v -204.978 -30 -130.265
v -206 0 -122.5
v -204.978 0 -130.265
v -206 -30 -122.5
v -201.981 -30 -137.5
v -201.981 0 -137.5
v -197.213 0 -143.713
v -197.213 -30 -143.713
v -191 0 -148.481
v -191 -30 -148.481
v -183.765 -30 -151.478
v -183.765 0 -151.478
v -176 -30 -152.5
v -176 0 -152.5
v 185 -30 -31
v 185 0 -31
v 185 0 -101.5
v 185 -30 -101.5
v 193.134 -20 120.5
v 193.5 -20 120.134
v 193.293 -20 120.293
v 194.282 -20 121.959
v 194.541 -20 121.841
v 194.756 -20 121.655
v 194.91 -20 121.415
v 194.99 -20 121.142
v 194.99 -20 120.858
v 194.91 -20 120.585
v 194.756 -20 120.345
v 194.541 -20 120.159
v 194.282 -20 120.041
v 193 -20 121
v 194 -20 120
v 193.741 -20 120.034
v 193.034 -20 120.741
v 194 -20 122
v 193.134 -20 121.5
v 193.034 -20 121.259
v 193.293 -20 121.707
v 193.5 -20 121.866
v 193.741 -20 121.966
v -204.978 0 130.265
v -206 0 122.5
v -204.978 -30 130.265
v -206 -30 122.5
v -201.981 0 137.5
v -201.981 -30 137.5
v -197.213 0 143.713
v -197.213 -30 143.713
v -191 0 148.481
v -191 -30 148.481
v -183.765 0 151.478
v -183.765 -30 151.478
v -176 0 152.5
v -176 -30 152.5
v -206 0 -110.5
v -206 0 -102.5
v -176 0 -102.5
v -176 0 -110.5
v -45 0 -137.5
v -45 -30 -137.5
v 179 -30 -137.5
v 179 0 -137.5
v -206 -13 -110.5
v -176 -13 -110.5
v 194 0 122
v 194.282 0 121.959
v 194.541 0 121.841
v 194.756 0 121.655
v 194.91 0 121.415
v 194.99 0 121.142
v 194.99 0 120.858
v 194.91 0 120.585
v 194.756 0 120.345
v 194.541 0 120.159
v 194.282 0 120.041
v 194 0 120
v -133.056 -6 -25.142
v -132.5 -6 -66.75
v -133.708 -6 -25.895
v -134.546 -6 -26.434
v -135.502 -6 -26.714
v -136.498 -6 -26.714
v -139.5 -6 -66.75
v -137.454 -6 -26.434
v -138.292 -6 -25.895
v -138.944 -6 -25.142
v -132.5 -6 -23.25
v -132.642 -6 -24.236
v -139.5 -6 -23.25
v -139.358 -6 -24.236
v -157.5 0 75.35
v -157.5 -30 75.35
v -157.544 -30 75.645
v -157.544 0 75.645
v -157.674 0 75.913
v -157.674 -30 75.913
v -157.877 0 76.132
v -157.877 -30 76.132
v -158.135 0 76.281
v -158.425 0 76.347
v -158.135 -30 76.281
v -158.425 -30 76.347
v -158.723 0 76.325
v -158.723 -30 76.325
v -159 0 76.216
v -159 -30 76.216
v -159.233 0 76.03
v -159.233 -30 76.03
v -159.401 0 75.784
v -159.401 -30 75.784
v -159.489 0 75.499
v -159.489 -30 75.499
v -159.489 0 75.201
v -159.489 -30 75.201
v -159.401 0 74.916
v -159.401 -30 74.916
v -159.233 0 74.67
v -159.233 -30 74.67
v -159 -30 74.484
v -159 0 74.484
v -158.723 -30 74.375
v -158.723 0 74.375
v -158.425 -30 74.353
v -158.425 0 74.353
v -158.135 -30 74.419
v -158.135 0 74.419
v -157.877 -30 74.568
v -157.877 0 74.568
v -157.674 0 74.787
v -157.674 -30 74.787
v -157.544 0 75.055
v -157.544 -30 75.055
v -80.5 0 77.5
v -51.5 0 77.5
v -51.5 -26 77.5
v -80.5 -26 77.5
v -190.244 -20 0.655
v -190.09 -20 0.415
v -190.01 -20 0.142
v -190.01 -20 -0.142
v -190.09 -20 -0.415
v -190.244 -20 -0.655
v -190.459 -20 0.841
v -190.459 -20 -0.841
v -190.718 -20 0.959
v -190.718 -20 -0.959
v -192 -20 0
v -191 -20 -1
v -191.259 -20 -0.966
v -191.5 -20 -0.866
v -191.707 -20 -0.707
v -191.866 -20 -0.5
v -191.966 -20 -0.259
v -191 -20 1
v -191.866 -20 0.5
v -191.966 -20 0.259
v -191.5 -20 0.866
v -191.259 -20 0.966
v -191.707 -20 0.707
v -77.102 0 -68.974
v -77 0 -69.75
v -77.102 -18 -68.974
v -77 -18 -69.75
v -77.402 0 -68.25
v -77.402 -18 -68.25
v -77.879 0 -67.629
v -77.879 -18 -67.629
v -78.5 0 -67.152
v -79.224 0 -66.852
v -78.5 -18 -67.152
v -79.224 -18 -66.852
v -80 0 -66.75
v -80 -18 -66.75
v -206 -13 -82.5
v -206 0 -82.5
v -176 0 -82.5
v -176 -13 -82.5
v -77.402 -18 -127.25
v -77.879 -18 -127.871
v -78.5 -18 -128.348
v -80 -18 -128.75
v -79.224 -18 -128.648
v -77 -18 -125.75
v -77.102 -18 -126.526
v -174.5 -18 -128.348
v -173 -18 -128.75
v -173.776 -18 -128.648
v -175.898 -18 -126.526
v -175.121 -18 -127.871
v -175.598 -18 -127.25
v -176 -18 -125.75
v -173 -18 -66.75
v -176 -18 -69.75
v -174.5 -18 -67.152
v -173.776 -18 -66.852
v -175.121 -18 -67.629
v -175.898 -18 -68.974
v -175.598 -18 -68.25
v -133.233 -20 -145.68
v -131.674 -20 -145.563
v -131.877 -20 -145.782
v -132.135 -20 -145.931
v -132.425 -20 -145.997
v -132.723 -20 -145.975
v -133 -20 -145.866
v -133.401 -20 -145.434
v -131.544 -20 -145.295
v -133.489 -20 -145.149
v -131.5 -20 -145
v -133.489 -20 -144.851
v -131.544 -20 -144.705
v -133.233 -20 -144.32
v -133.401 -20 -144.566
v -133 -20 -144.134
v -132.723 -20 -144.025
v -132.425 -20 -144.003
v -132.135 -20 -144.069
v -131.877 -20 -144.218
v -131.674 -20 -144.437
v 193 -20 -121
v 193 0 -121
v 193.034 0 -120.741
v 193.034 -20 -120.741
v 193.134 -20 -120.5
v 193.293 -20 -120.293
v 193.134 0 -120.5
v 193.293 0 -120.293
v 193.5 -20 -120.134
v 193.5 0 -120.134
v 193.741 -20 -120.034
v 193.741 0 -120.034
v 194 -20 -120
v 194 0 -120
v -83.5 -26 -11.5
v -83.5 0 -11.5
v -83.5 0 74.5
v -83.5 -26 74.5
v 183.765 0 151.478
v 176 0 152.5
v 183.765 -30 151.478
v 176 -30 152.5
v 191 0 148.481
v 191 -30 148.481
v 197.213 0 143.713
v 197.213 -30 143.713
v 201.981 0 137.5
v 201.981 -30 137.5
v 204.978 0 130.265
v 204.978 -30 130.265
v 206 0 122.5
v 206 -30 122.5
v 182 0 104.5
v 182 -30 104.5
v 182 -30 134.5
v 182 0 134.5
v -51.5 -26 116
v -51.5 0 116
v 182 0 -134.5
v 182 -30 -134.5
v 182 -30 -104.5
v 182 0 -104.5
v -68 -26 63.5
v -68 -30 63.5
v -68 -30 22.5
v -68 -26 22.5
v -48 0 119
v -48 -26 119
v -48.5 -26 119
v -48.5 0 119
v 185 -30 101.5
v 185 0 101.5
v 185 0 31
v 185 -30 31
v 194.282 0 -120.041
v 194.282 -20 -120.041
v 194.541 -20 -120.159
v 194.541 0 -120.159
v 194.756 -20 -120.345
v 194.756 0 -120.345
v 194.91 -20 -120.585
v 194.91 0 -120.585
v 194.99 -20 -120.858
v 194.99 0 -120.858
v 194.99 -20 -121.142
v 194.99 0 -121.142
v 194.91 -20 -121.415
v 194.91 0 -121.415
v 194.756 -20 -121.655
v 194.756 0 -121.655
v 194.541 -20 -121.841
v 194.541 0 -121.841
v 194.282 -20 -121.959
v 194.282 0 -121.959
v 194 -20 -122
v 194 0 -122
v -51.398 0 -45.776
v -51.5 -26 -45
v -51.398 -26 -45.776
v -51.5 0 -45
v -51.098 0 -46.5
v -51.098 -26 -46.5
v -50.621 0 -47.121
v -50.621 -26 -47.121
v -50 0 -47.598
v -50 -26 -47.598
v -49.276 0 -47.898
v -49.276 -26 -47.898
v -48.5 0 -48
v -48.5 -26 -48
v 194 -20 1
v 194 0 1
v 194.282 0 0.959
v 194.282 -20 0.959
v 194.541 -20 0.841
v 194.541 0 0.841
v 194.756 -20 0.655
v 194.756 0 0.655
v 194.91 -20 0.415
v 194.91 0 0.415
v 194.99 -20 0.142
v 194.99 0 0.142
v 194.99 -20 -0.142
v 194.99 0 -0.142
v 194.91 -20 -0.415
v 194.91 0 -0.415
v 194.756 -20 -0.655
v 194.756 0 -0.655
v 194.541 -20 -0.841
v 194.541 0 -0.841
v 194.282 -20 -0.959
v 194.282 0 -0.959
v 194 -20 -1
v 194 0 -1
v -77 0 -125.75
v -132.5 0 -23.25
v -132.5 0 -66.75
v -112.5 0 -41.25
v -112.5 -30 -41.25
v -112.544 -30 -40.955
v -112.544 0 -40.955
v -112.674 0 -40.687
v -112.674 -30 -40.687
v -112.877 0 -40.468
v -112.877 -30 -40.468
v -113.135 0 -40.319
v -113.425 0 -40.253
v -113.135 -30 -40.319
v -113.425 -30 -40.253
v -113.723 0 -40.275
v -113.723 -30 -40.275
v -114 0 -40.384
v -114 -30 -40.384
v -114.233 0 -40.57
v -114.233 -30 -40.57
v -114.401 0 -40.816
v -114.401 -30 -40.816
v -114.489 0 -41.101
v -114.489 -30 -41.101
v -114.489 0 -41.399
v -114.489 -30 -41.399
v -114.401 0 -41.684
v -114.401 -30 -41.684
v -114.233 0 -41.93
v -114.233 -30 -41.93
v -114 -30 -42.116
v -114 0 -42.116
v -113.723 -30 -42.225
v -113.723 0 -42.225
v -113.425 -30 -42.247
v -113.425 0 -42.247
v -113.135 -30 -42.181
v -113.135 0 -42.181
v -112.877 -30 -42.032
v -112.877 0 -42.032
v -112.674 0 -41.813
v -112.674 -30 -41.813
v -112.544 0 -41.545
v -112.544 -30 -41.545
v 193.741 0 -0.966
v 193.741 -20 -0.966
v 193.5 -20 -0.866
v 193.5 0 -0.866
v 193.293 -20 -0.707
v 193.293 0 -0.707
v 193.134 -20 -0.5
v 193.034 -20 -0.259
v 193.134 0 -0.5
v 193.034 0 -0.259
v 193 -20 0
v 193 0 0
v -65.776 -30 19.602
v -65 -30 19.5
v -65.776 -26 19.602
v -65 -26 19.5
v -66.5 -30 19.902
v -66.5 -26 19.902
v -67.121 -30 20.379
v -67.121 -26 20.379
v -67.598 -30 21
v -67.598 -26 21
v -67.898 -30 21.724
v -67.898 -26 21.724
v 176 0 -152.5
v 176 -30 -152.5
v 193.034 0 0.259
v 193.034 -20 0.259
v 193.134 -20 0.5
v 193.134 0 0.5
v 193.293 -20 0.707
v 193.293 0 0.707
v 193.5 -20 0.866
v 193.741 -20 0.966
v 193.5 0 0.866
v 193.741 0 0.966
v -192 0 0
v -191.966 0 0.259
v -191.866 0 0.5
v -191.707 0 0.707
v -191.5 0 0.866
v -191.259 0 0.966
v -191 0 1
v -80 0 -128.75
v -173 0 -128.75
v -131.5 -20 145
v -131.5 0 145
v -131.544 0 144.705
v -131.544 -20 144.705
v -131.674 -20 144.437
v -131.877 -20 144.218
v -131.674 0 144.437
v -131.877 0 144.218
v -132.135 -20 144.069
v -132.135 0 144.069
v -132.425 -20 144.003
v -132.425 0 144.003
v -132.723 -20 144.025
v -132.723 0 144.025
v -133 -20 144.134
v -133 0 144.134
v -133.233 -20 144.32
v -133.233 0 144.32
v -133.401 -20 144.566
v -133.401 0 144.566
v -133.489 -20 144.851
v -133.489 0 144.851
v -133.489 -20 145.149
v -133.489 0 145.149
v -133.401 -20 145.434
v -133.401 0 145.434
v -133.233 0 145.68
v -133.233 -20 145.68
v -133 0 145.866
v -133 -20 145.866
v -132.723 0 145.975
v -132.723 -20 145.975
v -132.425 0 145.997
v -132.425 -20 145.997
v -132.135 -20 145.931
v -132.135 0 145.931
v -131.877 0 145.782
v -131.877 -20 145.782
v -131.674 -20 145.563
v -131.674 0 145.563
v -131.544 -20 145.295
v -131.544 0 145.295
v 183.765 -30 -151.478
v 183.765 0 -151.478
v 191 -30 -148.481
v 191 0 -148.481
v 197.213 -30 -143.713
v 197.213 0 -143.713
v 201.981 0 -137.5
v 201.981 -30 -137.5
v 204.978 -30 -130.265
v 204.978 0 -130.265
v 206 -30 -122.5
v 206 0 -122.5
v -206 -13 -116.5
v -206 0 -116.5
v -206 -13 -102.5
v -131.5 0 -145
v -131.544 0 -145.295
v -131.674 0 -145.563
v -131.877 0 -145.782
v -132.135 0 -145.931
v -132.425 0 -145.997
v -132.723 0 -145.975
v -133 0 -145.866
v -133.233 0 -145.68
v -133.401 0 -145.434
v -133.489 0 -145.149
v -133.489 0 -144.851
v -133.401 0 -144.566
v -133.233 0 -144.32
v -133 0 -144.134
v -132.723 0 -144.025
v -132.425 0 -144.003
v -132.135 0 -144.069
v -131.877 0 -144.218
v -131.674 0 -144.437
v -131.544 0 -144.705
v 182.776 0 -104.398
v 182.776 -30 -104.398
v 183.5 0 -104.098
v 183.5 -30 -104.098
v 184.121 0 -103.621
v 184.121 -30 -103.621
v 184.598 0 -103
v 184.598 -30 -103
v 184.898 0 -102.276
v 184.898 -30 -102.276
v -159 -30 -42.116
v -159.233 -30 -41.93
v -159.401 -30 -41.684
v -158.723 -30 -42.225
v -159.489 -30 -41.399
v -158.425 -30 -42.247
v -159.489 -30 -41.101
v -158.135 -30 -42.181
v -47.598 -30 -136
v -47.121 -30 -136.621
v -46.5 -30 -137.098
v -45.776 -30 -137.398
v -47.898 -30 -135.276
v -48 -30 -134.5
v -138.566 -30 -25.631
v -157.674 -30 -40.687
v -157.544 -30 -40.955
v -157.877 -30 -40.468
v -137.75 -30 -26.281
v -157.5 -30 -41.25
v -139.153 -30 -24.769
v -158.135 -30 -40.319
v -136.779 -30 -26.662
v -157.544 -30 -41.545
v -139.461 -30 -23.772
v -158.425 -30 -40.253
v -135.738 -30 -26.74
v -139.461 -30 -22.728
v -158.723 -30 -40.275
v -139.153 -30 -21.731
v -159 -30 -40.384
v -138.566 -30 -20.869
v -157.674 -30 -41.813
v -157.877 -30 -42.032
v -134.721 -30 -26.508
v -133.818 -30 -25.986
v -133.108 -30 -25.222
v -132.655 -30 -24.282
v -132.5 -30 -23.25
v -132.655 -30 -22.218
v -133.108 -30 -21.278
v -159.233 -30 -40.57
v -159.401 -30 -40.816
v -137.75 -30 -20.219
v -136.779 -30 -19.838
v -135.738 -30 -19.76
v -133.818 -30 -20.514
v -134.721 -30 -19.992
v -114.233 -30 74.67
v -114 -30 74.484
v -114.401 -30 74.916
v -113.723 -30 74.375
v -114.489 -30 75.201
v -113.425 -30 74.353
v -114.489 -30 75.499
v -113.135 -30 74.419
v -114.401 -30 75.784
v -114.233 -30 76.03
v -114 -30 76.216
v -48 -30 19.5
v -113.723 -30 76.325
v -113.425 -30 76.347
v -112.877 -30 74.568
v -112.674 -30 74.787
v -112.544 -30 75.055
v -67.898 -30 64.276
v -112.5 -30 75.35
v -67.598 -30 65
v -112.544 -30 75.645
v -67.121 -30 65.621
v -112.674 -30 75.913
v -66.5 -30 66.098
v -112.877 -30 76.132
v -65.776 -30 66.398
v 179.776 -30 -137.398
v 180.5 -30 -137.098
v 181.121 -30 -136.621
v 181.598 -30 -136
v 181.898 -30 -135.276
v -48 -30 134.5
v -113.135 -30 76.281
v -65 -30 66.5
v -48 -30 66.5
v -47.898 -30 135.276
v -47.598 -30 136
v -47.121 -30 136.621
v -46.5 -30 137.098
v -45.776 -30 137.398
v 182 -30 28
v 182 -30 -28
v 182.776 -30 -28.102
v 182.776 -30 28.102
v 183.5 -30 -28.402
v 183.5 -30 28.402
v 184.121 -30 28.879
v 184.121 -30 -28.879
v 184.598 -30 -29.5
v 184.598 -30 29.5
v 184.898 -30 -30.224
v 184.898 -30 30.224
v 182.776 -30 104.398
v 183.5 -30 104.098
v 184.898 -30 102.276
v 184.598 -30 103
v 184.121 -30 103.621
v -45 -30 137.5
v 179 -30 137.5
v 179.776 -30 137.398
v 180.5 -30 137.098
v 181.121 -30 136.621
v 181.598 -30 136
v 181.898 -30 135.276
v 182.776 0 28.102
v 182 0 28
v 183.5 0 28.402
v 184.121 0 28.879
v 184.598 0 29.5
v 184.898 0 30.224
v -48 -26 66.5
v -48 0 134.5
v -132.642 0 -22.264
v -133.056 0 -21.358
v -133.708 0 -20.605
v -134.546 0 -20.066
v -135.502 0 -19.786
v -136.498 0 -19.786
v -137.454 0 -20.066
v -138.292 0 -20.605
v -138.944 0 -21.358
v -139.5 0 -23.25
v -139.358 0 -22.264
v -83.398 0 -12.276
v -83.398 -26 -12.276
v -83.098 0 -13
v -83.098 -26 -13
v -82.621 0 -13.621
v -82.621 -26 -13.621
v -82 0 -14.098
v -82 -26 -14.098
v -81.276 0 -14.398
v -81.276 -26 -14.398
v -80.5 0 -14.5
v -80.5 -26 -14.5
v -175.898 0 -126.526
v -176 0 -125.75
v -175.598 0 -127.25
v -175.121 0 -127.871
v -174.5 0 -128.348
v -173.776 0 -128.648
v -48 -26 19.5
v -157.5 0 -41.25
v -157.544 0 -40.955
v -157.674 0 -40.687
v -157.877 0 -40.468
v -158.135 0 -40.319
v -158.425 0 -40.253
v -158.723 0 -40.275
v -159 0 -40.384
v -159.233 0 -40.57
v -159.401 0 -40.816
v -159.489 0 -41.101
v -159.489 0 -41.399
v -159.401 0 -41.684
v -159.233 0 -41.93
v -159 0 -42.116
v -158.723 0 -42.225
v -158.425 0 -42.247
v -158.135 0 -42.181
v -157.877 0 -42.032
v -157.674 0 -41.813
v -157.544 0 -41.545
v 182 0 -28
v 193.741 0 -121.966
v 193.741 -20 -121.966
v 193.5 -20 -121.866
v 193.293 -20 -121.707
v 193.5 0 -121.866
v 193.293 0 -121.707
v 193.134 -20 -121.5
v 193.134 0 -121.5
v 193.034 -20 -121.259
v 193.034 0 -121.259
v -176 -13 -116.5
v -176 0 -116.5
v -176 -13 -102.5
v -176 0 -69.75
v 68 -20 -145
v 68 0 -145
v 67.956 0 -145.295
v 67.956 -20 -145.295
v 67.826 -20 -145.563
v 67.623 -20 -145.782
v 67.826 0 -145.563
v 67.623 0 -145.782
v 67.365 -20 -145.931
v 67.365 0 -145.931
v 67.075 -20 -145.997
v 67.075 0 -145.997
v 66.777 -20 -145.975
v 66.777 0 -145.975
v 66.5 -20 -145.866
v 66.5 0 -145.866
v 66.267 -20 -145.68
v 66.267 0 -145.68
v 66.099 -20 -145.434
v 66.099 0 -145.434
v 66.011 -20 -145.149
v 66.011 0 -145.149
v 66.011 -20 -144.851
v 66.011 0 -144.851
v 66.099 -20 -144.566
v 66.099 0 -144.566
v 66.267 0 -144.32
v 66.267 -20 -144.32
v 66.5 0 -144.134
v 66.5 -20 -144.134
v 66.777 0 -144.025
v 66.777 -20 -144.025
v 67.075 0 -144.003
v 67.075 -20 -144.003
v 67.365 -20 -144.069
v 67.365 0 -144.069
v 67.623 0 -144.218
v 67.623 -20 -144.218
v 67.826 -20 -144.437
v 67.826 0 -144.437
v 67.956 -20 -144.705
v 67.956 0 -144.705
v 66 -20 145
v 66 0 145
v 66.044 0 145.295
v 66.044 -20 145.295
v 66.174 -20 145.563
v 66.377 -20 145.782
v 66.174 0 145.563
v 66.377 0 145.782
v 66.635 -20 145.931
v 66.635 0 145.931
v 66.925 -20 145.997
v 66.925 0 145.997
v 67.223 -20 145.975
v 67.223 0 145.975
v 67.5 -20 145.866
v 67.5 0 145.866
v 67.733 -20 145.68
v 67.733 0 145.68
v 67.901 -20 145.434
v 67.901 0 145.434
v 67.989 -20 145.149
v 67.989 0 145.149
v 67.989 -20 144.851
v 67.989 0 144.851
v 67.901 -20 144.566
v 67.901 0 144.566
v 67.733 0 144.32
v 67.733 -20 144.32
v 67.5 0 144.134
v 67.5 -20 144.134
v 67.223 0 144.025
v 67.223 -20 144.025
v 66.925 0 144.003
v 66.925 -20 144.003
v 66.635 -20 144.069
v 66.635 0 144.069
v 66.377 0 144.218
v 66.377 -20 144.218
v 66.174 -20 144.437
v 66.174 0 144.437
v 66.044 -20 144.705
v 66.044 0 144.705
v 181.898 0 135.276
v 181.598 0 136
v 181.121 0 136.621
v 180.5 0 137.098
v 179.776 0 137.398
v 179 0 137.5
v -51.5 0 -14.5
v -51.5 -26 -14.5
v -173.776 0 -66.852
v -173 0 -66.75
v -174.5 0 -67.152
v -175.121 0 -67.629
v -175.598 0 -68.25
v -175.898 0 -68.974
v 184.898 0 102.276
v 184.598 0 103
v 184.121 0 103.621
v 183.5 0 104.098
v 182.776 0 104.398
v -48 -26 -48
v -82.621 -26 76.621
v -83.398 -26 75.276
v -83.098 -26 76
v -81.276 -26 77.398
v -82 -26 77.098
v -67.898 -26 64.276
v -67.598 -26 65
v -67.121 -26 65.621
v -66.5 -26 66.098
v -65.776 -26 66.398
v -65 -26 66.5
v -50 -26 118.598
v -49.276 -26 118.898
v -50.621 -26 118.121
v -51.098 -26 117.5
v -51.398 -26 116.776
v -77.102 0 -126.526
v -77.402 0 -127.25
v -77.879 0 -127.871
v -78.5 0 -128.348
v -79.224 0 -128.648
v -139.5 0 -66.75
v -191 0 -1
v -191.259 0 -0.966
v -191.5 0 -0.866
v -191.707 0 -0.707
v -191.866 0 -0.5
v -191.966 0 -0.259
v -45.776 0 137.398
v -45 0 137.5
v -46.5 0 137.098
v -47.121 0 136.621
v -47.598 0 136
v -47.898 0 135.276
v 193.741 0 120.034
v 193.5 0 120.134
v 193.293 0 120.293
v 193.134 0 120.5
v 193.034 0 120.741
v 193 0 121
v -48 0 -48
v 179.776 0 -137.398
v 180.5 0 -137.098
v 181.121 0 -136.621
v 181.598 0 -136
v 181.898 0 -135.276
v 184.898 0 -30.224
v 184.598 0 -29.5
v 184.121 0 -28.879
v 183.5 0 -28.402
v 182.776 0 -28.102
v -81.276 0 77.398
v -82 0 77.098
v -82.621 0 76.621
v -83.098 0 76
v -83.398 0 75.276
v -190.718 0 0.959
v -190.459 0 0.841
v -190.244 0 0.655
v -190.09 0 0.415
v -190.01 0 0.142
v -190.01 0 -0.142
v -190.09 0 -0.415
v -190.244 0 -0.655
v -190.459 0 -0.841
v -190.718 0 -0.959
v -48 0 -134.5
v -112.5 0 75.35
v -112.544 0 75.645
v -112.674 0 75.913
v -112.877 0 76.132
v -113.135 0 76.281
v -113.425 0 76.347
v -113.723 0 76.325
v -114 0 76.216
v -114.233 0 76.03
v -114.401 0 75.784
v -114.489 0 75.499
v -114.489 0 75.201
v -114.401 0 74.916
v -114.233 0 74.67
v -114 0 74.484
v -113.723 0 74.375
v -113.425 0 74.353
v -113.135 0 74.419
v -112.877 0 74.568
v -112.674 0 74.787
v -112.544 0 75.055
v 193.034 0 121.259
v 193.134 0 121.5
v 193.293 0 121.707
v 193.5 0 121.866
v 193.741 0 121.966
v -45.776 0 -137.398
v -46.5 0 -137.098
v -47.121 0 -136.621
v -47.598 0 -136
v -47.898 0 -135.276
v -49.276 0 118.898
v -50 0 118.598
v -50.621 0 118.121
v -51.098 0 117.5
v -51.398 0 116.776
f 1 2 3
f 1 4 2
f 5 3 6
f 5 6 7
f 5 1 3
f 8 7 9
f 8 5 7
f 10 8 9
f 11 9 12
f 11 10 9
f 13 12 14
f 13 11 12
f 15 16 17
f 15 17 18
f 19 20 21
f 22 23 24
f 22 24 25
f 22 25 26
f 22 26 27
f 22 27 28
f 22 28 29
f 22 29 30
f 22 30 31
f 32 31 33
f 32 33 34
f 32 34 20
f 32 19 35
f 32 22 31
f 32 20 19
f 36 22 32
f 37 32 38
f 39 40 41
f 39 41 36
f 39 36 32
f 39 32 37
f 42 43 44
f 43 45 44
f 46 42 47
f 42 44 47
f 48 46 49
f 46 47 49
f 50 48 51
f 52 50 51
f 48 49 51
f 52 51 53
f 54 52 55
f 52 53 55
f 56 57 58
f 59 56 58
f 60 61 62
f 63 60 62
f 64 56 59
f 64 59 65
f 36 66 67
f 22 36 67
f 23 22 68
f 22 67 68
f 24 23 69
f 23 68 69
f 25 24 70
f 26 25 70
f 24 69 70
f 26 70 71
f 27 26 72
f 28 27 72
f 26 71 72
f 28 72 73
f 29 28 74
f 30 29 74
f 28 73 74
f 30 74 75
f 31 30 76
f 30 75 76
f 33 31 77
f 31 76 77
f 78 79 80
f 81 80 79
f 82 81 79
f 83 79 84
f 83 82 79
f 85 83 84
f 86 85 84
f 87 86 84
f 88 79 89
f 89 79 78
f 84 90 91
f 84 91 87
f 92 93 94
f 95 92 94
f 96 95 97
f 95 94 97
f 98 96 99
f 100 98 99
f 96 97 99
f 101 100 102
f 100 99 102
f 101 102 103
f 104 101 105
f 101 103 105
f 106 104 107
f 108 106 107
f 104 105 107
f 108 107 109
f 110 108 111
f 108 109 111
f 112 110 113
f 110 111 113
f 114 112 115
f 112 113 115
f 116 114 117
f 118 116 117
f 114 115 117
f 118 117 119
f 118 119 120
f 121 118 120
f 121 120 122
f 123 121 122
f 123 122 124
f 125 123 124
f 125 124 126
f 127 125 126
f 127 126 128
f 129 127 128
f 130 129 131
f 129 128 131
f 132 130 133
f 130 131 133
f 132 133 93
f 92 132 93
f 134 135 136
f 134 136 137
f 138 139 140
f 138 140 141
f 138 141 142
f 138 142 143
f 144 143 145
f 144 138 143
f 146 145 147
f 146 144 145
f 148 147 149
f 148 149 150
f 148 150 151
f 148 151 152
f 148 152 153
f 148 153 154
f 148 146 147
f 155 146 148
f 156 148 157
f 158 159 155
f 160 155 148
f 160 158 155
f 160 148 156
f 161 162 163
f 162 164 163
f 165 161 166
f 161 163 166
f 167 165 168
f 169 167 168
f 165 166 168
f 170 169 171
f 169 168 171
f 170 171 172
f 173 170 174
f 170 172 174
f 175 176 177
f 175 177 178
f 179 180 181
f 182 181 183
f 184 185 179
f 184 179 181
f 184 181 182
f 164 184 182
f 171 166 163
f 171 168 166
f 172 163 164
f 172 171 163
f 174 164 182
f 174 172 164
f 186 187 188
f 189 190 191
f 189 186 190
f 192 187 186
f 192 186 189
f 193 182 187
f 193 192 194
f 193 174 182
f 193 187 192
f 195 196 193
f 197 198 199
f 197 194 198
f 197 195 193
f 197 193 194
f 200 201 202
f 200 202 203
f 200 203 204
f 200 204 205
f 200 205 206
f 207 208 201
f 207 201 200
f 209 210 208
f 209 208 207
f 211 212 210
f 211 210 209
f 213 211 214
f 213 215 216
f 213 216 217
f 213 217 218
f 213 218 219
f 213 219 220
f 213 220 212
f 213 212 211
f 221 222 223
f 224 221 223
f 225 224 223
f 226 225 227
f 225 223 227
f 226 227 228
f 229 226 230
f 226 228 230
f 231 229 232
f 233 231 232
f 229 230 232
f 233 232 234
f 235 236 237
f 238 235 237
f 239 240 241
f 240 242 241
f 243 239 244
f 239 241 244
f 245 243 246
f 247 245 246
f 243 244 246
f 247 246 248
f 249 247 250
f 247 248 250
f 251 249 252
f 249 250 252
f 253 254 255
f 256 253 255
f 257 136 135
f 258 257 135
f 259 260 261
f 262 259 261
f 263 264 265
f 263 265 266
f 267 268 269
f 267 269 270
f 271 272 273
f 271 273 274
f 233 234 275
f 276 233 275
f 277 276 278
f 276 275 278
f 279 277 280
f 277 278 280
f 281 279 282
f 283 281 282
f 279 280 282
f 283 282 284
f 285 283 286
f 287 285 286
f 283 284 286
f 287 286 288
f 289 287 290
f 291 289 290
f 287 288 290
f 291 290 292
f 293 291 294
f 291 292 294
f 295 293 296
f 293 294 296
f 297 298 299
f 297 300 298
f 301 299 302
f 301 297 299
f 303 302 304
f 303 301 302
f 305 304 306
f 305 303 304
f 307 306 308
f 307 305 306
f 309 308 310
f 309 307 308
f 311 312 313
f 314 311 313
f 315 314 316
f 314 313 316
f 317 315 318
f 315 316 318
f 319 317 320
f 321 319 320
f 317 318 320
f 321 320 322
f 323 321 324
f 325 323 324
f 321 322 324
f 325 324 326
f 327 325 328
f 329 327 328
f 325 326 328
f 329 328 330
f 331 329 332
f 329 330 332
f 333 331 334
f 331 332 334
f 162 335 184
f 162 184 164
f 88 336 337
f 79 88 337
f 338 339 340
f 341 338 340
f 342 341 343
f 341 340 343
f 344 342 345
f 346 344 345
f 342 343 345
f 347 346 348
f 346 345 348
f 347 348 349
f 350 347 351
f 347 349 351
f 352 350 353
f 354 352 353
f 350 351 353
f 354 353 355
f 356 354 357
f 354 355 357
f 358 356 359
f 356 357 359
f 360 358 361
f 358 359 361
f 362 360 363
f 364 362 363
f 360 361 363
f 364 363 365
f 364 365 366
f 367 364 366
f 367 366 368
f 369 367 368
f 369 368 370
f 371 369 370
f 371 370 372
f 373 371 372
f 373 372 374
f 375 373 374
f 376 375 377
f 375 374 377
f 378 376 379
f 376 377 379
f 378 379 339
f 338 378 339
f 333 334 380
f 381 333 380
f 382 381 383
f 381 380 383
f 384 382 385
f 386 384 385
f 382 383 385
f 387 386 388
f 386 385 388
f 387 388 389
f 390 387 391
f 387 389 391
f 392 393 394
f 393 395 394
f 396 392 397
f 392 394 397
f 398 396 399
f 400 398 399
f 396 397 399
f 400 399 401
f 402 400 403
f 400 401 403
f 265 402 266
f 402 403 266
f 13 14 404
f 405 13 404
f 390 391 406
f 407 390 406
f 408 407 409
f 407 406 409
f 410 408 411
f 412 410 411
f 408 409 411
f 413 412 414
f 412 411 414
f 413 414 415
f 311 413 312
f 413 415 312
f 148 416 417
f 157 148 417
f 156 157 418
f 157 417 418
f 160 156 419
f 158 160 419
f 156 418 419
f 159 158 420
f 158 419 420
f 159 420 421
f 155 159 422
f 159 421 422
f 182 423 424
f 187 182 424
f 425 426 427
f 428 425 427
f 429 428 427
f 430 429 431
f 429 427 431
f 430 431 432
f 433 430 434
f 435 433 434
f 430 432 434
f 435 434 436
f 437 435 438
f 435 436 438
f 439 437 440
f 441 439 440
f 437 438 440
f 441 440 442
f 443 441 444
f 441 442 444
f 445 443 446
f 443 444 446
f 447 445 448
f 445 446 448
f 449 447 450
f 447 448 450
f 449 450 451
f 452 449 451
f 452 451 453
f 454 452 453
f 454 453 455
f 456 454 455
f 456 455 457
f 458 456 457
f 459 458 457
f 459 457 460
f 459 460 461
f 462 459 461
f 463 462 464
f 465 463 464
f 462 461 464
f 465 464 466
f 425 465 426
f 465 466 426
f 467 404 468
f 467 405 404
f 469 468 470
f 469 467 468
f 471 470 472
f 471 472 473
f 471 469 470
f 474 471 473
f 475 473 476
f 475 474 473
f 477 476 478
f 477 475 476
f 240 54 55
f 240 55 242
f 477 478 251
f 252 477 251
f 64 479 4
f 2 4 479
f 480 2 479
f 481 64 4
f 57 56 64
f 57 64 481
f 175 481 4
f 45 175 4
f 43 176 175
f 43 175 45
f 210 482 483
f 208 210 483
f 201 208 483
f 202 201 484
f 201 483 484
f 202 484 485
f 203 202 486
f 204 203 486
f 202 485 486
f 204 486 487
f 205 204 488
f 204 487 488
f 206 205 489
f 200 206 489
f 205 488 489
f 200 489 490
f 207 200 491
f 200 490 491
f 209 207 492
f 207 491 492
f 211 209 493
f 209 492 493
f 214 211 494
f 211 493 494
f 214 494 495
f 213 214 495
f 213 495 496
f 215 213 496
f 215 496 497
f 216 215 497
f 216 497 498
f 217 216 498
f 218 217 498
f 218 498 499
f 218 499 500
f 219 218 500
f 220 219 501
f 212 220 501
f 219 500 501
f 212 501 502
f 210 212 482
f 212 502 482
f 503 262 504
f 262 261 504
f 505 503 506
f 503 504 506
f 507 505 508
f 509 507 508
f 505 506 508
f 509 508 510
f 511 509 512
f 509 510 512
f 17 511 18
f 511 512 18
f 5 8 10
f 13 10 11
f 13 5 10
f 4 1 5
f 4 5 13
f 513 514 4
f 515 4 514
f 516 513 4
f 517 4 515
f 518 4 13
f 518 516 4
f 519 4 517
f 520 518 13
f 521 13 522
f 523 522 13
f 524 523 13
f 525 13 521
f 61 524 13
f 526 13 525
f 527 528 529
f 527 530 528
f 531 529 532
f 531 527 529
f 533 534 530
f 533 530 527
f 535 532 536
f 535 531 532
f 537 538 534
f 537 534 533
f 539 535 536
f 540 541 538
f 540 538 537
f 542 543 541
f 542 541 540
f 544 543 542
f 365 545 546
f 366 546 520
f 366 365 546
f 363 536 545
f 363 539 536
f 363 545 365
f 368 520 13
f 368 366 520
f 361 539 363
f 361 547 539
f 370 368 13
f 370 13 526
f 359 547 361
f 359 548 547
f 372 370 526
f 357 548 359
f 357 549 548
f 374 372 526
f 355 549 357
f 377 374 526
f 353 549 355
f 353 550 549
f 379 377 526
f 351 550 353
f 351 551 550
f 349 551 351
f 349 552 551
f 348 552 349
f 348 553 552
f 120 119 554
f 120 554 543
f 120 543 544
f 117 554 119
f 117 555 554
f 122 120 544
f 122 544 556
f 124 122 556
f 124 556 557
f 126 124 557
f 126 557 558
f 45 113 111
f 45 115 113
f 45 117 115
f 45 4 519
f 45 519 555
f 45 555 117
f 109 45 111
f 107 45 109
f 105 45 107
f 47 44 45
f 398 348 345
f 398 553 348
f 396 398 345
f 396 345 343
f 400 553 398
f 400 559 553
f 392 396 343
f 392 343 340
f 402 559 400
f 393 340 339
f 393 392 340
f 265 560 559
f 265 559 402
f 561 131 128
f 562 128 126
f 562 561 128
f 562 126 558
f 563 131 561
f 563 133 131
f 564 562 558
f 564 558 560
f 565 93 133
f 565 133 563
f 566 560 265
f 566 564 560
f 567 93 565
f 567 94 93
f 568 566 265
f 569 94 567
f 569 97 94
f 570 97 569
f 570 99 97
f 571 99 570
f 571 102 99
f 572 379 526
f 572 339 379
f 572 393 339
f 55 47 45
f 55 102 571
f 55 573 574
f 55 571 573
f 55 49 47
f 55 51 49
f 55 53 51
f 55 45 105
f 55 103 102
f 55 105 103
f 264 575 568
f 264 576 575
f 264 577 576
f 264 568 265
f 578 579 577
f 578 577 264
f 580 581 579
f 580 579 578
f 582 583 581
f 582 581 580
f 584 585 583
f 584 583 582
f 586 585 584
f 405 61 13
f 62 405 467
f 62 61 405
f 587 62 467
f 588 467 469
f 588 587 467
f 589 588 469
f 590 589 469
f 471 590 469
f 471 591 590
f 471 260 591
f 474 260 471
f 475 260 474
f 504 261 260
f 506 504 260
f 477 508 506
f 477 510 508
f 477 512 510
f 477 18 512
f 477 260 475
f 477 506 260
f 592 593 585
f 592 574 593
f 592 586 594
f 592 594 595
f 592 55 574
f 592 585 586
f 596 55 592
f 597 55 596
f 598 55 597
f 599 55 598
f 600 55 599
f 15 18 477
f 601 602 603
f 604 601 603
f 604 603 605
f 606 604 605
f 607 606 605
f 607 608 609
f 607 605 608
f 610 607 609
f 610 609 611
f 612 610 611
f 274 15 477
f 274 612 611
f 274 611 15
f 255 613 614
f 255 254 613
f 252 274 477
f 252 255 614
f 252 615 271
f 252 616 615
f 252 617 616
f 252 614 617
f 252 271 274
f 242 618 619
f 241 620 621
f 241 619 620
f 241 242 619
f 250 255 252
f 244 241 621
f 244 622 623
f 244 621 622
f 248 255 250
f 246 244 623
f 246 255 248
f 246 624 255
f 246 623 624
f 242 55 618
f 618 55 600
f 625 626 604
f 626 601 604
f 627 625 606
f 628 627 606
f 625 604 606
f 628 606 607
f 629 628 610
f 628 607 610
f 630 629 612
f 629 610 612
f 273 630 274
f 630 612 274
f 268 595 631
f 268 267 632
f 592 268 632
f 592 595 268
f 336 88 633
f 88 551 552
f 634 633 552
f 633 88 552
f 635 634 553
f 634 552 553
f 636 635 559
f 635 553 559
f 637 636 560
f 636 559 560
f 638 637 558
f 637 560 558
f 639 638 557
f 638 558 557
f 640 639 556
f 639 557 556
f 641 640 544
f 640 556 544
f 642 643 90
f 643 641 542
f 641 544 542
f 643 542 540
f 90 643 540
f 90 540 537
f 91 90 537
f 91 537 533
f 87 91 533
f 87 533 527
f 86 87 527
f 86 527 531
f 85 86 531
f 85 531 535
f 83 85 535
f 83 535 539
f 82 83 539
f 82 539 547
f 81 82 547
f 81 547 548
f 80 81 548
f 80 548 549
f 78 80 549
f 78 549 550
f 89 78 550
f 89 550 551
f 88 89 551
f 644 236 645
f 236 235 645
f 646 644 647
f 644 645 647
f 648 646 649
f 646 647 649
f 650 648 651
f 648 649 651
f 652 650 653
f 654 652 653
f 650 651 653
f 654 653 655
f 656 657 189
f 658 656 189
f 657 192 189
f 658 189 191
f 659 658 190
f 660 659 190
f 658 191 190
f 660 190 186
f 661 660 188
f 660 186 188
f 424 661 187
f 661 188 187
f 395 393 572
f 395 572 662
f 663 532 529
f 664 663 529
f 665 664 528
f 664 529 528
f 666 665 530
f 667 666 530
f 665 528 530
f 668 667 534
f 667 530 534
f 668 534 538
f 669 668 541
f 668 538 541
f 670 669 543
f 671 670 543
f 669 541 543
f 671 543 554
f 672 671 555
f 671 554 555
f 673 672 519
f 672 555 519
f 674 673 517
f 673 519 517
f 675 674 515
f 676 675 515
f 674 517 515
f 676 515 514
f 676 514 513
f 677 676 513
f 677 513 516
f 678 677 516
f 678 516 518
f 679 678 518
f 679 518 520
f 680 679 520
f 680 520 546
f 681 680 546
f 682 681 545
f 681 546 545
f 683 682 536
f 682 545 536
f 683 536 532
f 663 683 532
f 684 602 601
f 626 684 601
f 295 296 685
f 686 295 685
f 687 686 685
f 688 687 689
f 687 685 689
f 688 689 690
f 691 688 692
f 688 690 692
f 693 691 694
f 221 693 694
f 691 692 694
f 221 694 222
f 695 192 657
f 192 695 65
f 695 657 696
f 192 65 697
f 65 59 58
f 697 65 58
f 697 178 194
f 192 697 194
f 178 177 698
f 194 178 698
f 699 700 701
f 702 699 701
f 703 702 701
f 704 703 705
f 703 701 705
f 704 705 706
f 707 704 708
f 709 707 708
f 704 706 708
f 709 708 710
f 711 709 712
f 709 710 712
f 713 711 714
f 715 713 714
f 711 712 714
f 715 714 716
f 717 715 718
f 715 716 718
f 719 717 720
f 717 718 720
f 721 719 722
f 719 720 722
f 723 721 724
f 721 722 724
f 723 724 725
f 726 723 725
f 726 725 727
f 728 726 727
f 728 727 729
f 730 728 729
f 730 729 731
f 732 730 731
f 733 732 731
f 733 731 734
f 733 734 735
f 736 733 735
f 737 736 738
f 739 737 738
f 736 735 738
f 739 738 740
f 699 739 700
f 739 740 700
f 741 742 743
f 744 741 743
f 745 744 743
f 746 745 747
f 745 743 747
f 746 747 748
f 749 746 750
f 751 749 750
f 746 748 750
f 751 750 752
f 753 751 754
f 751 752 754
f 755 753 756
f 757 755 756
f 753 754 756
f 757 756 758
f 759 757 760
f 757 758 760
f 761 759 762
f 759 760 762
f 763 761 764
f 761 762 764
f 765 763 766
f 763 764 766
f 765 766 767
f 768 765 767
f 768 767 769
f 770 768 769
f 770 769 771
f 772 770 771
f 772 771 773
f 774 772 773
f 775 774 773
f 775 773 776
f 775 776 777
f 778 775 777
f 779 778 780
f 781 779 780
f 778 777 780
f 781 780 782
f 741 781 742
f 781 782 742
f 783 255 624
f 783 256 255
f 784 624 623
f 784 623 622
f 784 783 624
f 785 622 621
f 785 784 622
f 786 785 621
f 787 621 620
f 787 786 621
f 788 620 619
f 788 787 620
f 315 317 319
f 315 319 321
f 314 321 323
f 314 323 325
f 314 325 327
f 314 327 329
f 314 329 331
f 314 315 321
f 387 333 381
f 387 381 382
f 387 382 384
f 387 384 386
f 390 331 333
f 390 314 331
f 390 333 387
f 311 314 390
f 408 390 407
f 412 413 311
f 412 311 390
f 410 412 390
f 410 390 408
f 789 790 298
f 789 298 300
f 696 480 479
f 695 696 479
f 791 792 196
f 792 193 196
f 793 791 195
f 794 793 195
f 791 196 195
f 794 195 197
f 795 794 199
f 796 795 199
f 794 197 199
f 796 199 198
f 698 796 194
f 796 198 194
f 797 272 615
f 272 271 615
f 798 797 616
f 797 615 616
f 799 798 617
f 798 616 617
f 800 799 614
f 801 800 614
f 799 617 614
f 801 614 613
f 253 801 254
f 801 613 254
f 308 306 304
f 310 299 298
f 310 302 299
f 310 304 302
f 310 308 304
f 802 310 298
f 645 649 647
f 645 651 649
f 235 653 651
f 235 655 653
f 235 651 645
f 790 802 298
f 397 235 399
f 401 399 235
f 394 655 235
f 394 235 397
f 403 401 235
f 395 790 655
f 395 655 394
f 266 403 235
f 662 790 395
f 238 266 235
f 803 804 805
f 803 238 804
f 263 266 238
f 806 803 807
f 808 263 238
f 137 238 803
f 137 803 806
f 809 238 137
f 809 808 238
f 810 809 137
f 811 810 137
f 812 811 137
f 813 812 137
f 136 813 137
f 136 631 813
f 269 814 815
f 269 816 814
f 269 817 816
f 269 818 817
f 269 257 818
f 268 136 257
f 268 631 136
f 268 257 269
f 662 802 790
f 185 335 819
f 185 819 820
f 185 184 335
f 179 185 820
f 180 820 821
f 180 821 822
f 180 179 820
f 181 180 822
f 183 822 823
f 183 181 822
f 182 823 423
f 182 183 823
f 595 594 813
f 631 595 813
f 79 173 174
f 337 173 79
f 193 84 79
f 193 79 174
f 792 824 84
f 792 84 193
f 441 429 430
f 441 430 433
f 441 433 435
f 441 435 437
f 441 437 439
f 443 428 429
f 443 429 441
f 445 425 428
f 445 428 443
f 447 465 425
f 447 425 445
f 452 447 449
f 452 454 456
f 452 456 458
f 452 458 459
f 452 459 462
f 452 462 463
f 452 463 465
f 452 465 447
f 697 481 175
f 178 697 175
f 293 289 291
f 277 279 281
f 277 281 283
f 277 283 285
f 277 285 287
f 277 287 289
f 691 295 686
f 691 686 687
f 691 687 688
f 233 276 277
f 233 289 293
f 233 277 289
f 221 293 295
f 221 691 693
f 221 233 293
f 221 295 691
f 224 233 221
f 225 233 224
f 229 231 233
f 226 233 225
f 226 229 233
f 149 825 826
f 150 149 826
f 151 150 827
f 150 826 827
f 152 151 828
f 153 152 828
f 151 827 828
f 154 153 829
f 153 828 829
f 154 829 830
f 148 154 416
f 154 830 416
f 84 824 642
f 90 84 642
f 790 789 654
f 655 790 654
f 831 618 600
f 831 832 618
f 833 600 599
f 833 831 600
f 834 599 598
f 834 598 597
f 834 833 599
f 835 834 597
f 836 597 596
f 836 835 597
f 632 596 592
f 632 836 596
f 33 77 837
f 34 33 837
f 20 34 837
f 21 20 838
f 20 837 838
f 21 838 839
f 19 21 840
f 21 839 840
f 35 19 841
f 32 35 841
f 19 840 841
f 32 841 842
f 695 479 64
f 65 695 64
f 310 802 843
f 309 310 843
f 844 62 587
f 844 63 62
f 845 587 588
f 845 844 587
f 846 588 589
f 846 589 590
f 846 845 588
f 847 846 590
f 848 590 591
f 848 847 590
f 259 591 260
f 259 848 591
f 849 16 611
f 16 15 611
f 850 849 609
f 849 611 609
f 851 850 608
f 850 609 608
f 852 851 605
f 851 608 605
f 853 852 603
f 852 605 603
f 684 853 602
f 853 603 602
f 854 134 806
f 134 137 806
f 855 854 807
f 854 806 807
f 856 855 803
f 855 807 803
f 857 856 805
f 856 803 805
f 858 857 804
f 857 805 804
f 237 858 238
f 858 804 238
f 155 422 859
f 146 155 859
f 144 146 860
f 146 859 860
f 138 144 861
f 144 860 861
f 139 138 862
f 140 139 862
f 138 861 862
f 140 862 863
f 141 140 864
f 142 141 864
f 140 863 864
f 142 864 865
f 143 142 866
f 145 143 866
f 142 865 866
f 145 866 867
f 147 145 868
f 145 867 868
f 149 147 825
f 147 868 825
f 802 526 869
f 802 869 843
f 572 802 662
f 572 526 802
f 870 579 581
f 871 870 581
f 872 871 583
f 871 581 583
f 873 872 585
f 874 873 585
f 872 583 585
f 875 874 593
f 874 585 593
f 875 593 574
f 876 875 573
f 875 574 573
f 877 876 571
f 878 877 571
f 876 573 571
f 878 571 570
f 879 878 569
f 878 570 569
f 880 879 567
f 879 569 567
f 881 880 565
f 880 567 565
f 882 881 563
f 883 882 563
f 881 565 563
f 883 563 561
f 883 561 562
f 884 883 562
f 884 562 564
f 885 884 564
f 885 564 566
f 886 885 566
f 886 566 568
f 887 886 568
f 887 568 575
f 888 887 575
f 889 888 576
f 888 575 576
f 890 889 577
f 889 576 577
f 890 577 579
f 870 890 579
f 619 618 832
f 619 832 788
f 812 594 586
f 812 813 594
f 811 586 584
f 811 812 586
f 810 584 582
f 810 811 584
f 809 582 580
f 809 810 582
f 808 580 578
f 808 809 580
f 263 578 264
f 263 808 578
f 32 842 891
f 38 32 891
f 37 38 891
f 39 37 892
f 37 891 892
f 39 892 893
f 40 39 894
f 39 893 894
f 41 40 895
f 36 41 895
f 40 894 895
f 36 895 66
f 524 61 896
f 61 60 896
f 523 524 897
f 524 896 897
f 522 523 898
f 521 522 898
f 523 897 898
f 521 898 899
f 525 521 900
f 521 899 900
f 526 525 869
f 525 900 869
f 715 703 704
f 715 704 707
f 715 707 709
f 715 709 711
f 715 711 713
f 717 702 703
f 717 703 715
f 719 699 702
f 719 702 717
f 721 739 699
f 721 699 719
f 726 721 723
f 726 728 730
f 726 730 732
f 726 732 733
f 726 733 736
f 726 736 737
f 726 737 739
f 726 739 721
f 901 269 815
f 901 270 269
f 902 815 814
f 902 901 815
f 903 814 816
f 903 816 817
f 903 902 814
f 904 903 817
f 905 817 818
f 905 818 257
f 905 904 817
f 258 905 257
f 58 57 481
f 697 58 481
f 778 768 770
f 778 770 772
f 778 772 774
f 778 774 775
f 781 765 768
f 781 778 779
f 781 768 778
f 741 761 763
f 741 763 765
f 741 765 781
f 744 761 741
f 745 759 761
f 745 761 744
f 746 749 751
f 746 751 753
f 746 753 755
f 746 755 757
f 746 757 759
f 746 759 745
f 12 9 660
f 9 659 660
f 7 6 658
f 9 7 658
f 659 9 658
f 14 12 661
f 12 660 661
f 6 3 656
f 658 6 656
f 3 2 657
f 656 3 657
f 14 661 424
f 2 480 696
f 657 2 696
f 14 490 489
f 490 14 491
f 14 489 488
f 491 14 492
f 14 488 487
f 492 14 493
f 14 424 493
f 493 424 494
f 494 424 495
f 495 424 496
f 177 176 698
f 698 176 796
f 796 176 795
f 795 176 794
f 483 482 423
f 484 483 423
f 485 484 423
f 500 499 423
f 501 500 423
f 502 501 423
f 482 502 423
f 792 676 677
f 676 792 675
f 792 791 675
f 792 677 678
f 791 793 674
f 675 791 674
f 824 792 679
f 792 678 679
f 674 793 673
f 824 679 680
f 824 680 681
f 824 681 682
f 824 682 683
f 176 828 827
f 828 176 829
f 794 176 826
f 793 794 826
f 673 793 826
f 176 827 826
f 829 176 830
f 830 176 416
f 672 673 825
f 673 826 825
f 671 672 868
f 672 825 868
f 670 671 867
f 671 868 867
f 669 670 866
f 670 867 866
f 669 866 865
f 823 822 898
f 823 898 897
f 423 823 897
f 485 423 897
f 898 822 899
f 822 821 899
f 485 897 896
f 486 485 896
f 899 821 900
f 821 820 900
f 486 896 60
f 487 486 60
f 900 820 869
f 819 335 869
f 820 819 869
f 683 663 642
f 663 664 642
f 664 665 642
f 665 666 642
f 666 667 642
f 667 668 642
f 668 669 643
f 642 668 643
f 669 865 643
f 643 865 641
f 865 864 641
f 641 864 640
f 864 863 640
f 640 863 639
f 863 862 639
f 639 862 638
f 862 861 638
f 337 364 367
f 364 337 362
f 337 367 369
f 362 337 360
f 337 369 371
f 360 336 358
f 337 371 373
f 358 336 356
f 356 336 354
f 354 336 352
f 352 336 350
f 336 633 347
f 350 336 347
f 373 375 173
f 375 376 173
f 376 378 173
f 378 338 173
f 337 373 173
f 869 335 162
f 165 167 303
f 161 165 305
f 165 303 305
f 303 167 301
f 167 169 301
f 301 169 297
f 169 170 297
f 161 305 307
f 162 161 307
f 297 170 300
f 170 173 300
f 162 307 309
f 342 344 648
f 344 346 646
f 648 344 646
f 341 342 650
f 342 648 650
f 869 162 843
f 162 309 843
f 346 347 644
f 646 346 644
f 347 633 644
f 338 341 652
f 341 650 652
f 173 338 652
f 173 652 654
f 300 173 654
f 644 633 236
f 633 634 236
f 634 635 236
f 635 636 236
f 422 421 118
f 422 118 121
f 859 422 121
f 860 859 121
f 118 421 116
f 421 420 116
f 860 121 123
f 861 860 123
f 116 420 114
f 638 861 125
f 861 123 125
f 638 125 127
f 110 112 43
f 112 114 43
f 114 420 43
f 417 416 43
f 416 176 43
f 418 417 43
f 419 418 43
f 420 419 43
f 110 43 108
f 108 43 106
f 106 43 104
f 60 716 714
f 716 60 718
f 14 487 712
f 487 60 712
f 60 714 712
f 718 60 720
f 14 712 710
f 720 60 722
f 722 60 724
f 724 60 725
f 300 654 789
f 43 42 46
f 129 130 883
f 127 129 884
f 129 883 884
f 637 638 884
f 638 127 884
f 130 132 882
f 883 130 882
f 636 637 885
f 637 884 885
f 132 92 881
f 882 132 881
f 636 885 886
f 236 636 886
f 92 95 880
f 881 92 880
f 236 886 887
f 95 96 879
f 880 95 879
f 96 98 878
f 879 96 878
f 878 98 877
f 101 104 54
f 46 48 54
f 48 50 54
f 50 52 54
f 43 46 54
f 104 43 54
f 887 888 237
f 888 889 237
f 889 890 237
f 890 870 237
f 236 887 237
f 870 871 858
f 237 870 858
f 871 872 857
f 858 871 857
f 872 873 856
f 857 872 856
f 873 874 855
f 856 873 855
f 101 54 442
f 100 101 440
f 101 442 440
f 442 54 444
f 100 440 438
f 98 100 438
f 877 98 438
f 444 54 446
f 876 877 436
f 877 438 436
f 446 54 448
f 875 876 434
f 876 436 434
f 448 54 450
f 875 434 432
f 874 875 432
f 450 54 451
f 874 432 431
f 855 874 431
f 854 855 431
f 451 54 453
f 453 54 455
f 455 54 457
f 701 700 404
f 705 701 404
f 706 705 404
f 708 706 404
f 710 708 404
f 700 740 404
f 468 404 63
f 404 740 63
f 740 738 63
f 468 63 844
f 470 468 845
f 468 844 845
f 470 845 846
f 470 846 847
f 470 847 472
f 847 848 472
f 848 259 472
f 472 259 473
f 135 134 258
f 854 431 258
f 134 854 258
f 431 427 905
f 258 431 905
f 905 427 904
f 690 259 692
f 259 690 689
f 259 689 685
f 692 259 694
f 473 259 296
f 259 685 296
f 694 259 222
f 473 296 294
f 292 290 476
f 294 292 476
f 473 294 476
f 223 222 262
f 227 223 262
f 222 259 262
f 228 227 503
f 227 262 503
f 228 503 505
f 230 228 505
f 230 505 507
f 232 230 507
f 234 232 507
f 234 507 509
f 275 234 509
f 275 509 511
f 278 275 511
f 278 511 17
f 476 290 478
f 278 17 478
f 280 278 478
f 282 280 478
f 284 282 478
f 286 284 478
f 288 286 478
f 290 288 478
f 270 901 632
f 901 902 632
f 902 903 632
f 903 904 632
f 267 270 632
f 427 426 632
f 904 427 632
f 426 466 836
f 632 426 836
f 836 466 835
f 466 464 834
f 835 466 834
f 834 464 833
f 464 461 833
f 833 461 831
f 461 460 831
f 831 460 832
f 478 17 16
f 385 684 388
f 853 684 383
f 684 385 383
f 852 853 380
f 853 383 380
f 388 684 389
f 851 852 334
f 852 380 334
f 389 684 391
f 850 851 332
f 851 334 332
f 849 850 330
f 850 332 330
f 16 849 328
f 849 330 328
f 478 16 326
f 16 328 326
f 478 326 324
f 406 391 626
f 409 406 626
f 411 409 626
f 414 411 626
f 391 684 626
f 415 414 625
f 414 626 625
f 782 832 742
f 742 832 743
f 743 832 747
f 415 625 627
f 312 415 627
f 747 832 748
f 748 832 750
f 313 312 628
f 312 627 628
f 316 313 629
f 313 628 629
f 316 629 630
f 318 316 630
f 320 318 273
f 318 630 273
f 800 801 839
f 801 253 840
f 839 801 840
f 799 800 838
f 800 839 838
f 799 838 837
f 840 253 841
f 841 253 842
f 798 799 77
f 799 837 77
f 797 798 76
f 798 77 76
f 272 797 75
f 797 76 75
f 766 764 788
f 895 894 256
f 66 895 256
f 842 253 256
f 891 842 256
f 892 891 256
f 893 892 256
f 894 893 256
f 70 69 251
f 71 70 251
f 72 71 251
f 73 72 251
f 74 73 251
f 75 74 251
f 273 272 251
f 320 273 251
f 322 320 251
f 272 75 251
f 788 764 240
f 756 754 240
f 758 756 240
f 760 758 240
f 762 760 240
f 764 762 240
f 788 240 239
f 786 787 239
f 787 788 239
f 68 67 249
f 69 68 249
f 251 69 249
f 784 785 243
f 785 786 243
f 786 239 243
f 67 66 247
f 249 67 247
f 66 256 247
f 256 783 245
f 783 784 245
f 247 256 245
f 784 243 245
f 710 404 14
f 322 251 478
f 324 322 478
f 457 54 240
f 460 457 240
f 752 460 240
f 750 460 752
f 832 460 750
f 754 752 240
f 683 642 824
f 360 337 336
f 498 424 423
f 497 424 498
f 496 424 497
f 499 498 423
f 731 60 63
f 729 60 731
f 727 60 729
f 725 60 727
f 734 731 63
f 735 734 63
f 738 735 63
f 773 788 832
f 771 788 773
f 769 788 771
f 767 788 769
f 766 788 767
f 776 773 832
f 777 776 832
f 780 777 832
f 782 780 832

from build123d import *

# Parameters (mm, degrees)
F0_W      = 412
F0_H      = 305
F1_DEPTH  = 30
F2_W      = 230
F2_H      = 275
F3_DEPTH  = 30
F4_R      = 3
F5_R      = 30
F6_W      = 26
F6_H      = 167
F7_DEPTH  = 3.5
F8_R      = 3
F10_W     = 32
F10_H     = 92
F11_DEPTH = 26
F12_R     = 3
F13_W     = 4
F13_H     = 47
F14_DEPTH = 20
F15_R     = 3
F16_W     = 30
F16_H     = 76.5
F17_DEPTH = 3
F18_R     = 2.99999
F19_R     = 3.5
F20_DEPTH = 30
F21_W     = 99
F21_H     = 62
F22_DEPTH = 18
F23_R     = 3
F25_DEPTH = 6
F26_W     = 13
F26_H     = 20
F26_H_2   = 6
F27_DEPTH = 30
F28_R     = 1
F29_DEPTH = 30
F31_DEPTH = 20


# Not quite as in the source:
# - a fillet or chamfer is up to 0.001 mm smaller than in the source, because OpenCascade refuses the exact size
# - a feature names something its author has since deleted; it is built from what else it names


with BuildPart() as f1:
    # F0 (on Front) → F1 (new body)
    with BuildSketch(Plane.XZ):
        Rectangle(F0_W, F0_H)
    extrude(amount=F1_DEPTH)

    # F2 (on face) → F3 (cut, through all)
    with BuildSketch(Plane.XZ.offset(30)):
        with Locations((67, 0)):
            Rectangle(F2_W, F2_H)
    extrude(amount=-F3_DEPTH, mode=Mode.SUBTRACT)

    # F4
    f4_edges = [f1.edges().sort_by_distance(p)[0] for p in [
        (-48, -15, 137.5),
        (182, -15, 137.5),
        (182, -15, -137.5),
        (-48, -15, -137.5),
    ]]
    fillet(f4_edges, radius=F4_R)

    # F5
    f5_edges = [f1.edges().sort_by_distance(p)[0] for p in [
        (-206, -15, -152.5),
        (-206, -15, 152.5),
        (206, -15, 152.5),
        (206, -15, -152.5),
    ]]
    fillet(f5_edges, radius=F5_R)

    # F6 (on face) → F7 (cut)
    with BuildSketch(Plane.YZ.offset(-48)):
        with Locations((-13, 35.5)):
            Rectangle(F6_W, F6_H)
    extrude(amount=-F7_DEPTH, mode=Mode.SUBTRACT)

    # F8
    f8_edges = [f1.edges().sort_by_distance(p)[0] for p in [
        (-51.5, -13, -48),
        (-51.5, -13, 119),
    ]]
    fillet(f8_edges, radius=F8_R)

    # F10 (on face) → F11 (cut)
    with BuildSketch(Plane(origin=(0, 0, 0), x_dir=(-1, 0, 0), z_dir=(0, 1, 0))):
        with Locations((67.5, 31.5)):
            Rectangle(F10_W, F10_H)
    extrude(amount=-F11_DEPTH, mode=Mode.SUBTRACT)

    # F12
    f12_edges = [f1.edges().sort_by_distance(p)[0] for p in [
        (-83.5, -13, -14.5),
        (-83.5, -13, 77.5),
    ]]
    fillet(f12_edges, radius=F12_R)

    # F13 (on face) → F14 (cut)
    with BuildSketch(Plane.YZ.offset(-48)):
        with Locations((-28, 43)):
            Rectangle(F13_W, F13_H)
    extrude(amount=-F14_DEPTH, mode=Mode.SUBTRACT)

    # F15
    f15_edges = [f1.edges().sort_by_distance(p)[0] for p in [
        (-68, -28, 19.5),
        (-68, -28, 66.5),
    ]]
    fillet(f15_edges, radius=F15_R)

    # F16 (on face) → F17 (cut)
    with BuildSketch(Plane(origin=(182, 0, 0), x_dir=(0, -1, 0), z_dir=(-1, 0, 0))):
        with Locations((15, -66.25)):
            Rectangle(F16_W, F16_H)
        with Locations((15, 66.25)):
            Rectangle(F16_W, F16_H)
    extrude(amount=-F17_DEPTH, mode=Mode.SUBTRACT)

    # F18 (radius 3 in the source; OpenCascade refuses exactly that, so slightly less here)
    f18_edges = [f1.edges().sort_by_distance(p)[0] for p in [
        (185, -15, -104.5),
        (185, -15, 28),
        (185, -15, 104.5),
        (185, -15, -28),
    ]]
    fillet(f18_edges, radius=F18_R)

    # F19 (on face) → F20 (cut)
    with BuildSketch(Plane.XZ.offset(30)):
        with Locations((-136, -23.25)):
            Circle(F19_R)
    extrude(amount=-F20_DEPTH, mode=Mode.SUBTRACT)

    # F21 (on face) → F22 (cut)
    with BuildSketch(Plane(origin=(0, 0, 0), x_dir=(-1, 0, 0), z_dir=(0, 1, 0))):
        with Locations((126.5, -97.75)):
            Rectangle(F21_W, F21_H)
    extrude(amount=-F22_DEPTH, mode=Mode.SUBTRACT)

    # F23
    f23_edges = [f1.edges().sort_by_distance(p)[0] for p in [
        (-176, -9, -128.75),
        (-77, -9, -128.75),
        (-77, -9, -66.75),
        (-176, -9, -66.75),
    ]]
    fillet(f23_edges, radius=F23_R)

    # F24 (on face) → F25 (cut)
    with BuildSketch(Plane(origin=(0, 0, 0), x_dir=(-1, 0, 0), z_dir=(0, 1, 0))):
        with BuildLine():
            ThreePointArc((139.5, -23.25), (136, -26.75), (132.5, -23.25))
            Line((132.5, -23.25), (132.5, -66.75))
            Line((132.5, -66.75), (139.5, -66.75))
            Line((139.5, -66.75), (139.5, -23.25))
        make_face()
    extrude(amount=-F25_DEPTH, mode=Mode.SUBTRACT)

    # F26 (on face) → F27 (cut)
    with BuildSketch(Plane(origin=(-206, 0, 0), x_dir=(0, -1, 0), z_dir=(-1, 0, 0))):
        with Locations((6.5, -92.5)):
            Rectangle(F26_W, F26_H)
        with Locations((6.5, -113.5)):
            Rectangle(F26_W, F26_H_2)
    extrude(amount=-F27_DEPTH, mode=Mode.SUBTRACT)

    # F28 (on face) → F29 (cut)
    with BuildSketch(Plane.XZ.offset(30)):
        with Locations((-158.5, 75.35)):
            Circle(F28_R)
        with Locations((-158.5, -41.25)):
            Circle(F28_R)
        with Locations((-113.5, -41.25)):
            Circle(F28_R)
        with Locations((-113.5, 75.35)):
            Circle(F28_R)
    extrude(amount=-F29_DEPTH, mode=Mode.SUBTRACT)

    # F30 (on face) → F31 (cut)
    with BuildSketch(Plane(origin=(0, 0, 0), x_dir=(-1, 0, 0), z_dir=(0, 1, 0))):
        with BuildLine():
            Line((-194, 120), (-194, 122))
            ThreePointArc((-194, 122), (-195, 121), (-194, 120))
        make_face()
        with BuildLine():
            ThreePointArc((-193, 121), (-193.2928932188, 121.7071067812), (-194, 122))
            Line((-194, 122), (-194, 120))
            ThreePointArc((-194, 120), (-193.2928932188, 120.2928932188), (-193, 121))
        make_face()
        with BuildLine():
            ThreePointArc((-68, 145), (-67, 144), (-66, 145))
            Line((-66, 145), (-68, 145))
        make_face()
        with BuildLine():
            Line((-68, 145), (-66, 145))
            ThreePointArc((-66, 145), (-67, 146), (-68, 145))
        make_face()
        with BuildLine():
            Line((131.5, 145), (133.5, 145))
            ThreePointArc((133.5, 145), (132.5, 146), (131.5, 145))
        make_face()
        with BuildLine():
            ThreePointArc((131.5, 145), (132.5, 144), (133.5, 145))
            Line((133.5, 145), (131.5, 145))
        make_face()
        with BuildLine():
            ThreePointArc((192, 0), (191.7071067812, 0.7071067812), (191, 1))
            Line((191, 1), (191, -1))
            ThreePointArc((191, -1), (191.7071067812, -0.7071067812), (192, 0))
        make_face()
        with BuildLine():
            Line((191, -1), (191, 1))
            ThreePointArc((191, 1), (190, 0), (191, -1))
        make_face()
        with BuildLine():
            Line((131.5, -145), (133.5, -145))
            ThreePointArc((133.5, -145), (132.5, -144), (131.5, -145))
        make_face()
        with BuildLine():
            ThreePointArc((131.5, -145), (132.5, -146), (133.5, -145))
            Line((133.5, -145), (131.5, -145))
        make_face()
        with BuildLine():
            Line((-68, -145), (-66, -145))
            ThreePointArc((-66, -145), (-67, -144), (-68, -145))
        make_face()
        with BuildLine():
            ThreePointArc((-68, -145), (-67, -146), (-66, -145))
            Line((-66, -145), (-68, -145))
        make_face()
        with BuildLine():
            ThreePointArc((-193, -121), (-193.2928932188, -120.2928932188), (-194, -120))
            Line((-194, -120), (-194, -122))
            ThreePointArc((-194, -122), (-193.2928932188, -121.7071067812), (-193, -121))
        make_face()
        with BuildLine():
            Line((-194, -122), (-194, -120))
            ThreePointArc((-194, -120), (-195, -121), (-194, -122))
        make_face()
        with BuildLine():
            Line((-194, -1), (-194, 1))
            ThreePointArc((-194, 1), (-195, 0), (-194, -1))
        make_face()
        with BuildLine():
            ThreePointArc((-193, 0), (-193.2928932188, 0.7071067812), (-194, 1))
            Line((-194, 1), (-194, -1))
            ThreePointArc((-194, -1), (-193.2928932188, -0.7071067812), (-193, 0))
        make_face()
    extrude(amount=-F31_DEPTH, mode=Mode.SUBTRACT)


solid = f1.part
